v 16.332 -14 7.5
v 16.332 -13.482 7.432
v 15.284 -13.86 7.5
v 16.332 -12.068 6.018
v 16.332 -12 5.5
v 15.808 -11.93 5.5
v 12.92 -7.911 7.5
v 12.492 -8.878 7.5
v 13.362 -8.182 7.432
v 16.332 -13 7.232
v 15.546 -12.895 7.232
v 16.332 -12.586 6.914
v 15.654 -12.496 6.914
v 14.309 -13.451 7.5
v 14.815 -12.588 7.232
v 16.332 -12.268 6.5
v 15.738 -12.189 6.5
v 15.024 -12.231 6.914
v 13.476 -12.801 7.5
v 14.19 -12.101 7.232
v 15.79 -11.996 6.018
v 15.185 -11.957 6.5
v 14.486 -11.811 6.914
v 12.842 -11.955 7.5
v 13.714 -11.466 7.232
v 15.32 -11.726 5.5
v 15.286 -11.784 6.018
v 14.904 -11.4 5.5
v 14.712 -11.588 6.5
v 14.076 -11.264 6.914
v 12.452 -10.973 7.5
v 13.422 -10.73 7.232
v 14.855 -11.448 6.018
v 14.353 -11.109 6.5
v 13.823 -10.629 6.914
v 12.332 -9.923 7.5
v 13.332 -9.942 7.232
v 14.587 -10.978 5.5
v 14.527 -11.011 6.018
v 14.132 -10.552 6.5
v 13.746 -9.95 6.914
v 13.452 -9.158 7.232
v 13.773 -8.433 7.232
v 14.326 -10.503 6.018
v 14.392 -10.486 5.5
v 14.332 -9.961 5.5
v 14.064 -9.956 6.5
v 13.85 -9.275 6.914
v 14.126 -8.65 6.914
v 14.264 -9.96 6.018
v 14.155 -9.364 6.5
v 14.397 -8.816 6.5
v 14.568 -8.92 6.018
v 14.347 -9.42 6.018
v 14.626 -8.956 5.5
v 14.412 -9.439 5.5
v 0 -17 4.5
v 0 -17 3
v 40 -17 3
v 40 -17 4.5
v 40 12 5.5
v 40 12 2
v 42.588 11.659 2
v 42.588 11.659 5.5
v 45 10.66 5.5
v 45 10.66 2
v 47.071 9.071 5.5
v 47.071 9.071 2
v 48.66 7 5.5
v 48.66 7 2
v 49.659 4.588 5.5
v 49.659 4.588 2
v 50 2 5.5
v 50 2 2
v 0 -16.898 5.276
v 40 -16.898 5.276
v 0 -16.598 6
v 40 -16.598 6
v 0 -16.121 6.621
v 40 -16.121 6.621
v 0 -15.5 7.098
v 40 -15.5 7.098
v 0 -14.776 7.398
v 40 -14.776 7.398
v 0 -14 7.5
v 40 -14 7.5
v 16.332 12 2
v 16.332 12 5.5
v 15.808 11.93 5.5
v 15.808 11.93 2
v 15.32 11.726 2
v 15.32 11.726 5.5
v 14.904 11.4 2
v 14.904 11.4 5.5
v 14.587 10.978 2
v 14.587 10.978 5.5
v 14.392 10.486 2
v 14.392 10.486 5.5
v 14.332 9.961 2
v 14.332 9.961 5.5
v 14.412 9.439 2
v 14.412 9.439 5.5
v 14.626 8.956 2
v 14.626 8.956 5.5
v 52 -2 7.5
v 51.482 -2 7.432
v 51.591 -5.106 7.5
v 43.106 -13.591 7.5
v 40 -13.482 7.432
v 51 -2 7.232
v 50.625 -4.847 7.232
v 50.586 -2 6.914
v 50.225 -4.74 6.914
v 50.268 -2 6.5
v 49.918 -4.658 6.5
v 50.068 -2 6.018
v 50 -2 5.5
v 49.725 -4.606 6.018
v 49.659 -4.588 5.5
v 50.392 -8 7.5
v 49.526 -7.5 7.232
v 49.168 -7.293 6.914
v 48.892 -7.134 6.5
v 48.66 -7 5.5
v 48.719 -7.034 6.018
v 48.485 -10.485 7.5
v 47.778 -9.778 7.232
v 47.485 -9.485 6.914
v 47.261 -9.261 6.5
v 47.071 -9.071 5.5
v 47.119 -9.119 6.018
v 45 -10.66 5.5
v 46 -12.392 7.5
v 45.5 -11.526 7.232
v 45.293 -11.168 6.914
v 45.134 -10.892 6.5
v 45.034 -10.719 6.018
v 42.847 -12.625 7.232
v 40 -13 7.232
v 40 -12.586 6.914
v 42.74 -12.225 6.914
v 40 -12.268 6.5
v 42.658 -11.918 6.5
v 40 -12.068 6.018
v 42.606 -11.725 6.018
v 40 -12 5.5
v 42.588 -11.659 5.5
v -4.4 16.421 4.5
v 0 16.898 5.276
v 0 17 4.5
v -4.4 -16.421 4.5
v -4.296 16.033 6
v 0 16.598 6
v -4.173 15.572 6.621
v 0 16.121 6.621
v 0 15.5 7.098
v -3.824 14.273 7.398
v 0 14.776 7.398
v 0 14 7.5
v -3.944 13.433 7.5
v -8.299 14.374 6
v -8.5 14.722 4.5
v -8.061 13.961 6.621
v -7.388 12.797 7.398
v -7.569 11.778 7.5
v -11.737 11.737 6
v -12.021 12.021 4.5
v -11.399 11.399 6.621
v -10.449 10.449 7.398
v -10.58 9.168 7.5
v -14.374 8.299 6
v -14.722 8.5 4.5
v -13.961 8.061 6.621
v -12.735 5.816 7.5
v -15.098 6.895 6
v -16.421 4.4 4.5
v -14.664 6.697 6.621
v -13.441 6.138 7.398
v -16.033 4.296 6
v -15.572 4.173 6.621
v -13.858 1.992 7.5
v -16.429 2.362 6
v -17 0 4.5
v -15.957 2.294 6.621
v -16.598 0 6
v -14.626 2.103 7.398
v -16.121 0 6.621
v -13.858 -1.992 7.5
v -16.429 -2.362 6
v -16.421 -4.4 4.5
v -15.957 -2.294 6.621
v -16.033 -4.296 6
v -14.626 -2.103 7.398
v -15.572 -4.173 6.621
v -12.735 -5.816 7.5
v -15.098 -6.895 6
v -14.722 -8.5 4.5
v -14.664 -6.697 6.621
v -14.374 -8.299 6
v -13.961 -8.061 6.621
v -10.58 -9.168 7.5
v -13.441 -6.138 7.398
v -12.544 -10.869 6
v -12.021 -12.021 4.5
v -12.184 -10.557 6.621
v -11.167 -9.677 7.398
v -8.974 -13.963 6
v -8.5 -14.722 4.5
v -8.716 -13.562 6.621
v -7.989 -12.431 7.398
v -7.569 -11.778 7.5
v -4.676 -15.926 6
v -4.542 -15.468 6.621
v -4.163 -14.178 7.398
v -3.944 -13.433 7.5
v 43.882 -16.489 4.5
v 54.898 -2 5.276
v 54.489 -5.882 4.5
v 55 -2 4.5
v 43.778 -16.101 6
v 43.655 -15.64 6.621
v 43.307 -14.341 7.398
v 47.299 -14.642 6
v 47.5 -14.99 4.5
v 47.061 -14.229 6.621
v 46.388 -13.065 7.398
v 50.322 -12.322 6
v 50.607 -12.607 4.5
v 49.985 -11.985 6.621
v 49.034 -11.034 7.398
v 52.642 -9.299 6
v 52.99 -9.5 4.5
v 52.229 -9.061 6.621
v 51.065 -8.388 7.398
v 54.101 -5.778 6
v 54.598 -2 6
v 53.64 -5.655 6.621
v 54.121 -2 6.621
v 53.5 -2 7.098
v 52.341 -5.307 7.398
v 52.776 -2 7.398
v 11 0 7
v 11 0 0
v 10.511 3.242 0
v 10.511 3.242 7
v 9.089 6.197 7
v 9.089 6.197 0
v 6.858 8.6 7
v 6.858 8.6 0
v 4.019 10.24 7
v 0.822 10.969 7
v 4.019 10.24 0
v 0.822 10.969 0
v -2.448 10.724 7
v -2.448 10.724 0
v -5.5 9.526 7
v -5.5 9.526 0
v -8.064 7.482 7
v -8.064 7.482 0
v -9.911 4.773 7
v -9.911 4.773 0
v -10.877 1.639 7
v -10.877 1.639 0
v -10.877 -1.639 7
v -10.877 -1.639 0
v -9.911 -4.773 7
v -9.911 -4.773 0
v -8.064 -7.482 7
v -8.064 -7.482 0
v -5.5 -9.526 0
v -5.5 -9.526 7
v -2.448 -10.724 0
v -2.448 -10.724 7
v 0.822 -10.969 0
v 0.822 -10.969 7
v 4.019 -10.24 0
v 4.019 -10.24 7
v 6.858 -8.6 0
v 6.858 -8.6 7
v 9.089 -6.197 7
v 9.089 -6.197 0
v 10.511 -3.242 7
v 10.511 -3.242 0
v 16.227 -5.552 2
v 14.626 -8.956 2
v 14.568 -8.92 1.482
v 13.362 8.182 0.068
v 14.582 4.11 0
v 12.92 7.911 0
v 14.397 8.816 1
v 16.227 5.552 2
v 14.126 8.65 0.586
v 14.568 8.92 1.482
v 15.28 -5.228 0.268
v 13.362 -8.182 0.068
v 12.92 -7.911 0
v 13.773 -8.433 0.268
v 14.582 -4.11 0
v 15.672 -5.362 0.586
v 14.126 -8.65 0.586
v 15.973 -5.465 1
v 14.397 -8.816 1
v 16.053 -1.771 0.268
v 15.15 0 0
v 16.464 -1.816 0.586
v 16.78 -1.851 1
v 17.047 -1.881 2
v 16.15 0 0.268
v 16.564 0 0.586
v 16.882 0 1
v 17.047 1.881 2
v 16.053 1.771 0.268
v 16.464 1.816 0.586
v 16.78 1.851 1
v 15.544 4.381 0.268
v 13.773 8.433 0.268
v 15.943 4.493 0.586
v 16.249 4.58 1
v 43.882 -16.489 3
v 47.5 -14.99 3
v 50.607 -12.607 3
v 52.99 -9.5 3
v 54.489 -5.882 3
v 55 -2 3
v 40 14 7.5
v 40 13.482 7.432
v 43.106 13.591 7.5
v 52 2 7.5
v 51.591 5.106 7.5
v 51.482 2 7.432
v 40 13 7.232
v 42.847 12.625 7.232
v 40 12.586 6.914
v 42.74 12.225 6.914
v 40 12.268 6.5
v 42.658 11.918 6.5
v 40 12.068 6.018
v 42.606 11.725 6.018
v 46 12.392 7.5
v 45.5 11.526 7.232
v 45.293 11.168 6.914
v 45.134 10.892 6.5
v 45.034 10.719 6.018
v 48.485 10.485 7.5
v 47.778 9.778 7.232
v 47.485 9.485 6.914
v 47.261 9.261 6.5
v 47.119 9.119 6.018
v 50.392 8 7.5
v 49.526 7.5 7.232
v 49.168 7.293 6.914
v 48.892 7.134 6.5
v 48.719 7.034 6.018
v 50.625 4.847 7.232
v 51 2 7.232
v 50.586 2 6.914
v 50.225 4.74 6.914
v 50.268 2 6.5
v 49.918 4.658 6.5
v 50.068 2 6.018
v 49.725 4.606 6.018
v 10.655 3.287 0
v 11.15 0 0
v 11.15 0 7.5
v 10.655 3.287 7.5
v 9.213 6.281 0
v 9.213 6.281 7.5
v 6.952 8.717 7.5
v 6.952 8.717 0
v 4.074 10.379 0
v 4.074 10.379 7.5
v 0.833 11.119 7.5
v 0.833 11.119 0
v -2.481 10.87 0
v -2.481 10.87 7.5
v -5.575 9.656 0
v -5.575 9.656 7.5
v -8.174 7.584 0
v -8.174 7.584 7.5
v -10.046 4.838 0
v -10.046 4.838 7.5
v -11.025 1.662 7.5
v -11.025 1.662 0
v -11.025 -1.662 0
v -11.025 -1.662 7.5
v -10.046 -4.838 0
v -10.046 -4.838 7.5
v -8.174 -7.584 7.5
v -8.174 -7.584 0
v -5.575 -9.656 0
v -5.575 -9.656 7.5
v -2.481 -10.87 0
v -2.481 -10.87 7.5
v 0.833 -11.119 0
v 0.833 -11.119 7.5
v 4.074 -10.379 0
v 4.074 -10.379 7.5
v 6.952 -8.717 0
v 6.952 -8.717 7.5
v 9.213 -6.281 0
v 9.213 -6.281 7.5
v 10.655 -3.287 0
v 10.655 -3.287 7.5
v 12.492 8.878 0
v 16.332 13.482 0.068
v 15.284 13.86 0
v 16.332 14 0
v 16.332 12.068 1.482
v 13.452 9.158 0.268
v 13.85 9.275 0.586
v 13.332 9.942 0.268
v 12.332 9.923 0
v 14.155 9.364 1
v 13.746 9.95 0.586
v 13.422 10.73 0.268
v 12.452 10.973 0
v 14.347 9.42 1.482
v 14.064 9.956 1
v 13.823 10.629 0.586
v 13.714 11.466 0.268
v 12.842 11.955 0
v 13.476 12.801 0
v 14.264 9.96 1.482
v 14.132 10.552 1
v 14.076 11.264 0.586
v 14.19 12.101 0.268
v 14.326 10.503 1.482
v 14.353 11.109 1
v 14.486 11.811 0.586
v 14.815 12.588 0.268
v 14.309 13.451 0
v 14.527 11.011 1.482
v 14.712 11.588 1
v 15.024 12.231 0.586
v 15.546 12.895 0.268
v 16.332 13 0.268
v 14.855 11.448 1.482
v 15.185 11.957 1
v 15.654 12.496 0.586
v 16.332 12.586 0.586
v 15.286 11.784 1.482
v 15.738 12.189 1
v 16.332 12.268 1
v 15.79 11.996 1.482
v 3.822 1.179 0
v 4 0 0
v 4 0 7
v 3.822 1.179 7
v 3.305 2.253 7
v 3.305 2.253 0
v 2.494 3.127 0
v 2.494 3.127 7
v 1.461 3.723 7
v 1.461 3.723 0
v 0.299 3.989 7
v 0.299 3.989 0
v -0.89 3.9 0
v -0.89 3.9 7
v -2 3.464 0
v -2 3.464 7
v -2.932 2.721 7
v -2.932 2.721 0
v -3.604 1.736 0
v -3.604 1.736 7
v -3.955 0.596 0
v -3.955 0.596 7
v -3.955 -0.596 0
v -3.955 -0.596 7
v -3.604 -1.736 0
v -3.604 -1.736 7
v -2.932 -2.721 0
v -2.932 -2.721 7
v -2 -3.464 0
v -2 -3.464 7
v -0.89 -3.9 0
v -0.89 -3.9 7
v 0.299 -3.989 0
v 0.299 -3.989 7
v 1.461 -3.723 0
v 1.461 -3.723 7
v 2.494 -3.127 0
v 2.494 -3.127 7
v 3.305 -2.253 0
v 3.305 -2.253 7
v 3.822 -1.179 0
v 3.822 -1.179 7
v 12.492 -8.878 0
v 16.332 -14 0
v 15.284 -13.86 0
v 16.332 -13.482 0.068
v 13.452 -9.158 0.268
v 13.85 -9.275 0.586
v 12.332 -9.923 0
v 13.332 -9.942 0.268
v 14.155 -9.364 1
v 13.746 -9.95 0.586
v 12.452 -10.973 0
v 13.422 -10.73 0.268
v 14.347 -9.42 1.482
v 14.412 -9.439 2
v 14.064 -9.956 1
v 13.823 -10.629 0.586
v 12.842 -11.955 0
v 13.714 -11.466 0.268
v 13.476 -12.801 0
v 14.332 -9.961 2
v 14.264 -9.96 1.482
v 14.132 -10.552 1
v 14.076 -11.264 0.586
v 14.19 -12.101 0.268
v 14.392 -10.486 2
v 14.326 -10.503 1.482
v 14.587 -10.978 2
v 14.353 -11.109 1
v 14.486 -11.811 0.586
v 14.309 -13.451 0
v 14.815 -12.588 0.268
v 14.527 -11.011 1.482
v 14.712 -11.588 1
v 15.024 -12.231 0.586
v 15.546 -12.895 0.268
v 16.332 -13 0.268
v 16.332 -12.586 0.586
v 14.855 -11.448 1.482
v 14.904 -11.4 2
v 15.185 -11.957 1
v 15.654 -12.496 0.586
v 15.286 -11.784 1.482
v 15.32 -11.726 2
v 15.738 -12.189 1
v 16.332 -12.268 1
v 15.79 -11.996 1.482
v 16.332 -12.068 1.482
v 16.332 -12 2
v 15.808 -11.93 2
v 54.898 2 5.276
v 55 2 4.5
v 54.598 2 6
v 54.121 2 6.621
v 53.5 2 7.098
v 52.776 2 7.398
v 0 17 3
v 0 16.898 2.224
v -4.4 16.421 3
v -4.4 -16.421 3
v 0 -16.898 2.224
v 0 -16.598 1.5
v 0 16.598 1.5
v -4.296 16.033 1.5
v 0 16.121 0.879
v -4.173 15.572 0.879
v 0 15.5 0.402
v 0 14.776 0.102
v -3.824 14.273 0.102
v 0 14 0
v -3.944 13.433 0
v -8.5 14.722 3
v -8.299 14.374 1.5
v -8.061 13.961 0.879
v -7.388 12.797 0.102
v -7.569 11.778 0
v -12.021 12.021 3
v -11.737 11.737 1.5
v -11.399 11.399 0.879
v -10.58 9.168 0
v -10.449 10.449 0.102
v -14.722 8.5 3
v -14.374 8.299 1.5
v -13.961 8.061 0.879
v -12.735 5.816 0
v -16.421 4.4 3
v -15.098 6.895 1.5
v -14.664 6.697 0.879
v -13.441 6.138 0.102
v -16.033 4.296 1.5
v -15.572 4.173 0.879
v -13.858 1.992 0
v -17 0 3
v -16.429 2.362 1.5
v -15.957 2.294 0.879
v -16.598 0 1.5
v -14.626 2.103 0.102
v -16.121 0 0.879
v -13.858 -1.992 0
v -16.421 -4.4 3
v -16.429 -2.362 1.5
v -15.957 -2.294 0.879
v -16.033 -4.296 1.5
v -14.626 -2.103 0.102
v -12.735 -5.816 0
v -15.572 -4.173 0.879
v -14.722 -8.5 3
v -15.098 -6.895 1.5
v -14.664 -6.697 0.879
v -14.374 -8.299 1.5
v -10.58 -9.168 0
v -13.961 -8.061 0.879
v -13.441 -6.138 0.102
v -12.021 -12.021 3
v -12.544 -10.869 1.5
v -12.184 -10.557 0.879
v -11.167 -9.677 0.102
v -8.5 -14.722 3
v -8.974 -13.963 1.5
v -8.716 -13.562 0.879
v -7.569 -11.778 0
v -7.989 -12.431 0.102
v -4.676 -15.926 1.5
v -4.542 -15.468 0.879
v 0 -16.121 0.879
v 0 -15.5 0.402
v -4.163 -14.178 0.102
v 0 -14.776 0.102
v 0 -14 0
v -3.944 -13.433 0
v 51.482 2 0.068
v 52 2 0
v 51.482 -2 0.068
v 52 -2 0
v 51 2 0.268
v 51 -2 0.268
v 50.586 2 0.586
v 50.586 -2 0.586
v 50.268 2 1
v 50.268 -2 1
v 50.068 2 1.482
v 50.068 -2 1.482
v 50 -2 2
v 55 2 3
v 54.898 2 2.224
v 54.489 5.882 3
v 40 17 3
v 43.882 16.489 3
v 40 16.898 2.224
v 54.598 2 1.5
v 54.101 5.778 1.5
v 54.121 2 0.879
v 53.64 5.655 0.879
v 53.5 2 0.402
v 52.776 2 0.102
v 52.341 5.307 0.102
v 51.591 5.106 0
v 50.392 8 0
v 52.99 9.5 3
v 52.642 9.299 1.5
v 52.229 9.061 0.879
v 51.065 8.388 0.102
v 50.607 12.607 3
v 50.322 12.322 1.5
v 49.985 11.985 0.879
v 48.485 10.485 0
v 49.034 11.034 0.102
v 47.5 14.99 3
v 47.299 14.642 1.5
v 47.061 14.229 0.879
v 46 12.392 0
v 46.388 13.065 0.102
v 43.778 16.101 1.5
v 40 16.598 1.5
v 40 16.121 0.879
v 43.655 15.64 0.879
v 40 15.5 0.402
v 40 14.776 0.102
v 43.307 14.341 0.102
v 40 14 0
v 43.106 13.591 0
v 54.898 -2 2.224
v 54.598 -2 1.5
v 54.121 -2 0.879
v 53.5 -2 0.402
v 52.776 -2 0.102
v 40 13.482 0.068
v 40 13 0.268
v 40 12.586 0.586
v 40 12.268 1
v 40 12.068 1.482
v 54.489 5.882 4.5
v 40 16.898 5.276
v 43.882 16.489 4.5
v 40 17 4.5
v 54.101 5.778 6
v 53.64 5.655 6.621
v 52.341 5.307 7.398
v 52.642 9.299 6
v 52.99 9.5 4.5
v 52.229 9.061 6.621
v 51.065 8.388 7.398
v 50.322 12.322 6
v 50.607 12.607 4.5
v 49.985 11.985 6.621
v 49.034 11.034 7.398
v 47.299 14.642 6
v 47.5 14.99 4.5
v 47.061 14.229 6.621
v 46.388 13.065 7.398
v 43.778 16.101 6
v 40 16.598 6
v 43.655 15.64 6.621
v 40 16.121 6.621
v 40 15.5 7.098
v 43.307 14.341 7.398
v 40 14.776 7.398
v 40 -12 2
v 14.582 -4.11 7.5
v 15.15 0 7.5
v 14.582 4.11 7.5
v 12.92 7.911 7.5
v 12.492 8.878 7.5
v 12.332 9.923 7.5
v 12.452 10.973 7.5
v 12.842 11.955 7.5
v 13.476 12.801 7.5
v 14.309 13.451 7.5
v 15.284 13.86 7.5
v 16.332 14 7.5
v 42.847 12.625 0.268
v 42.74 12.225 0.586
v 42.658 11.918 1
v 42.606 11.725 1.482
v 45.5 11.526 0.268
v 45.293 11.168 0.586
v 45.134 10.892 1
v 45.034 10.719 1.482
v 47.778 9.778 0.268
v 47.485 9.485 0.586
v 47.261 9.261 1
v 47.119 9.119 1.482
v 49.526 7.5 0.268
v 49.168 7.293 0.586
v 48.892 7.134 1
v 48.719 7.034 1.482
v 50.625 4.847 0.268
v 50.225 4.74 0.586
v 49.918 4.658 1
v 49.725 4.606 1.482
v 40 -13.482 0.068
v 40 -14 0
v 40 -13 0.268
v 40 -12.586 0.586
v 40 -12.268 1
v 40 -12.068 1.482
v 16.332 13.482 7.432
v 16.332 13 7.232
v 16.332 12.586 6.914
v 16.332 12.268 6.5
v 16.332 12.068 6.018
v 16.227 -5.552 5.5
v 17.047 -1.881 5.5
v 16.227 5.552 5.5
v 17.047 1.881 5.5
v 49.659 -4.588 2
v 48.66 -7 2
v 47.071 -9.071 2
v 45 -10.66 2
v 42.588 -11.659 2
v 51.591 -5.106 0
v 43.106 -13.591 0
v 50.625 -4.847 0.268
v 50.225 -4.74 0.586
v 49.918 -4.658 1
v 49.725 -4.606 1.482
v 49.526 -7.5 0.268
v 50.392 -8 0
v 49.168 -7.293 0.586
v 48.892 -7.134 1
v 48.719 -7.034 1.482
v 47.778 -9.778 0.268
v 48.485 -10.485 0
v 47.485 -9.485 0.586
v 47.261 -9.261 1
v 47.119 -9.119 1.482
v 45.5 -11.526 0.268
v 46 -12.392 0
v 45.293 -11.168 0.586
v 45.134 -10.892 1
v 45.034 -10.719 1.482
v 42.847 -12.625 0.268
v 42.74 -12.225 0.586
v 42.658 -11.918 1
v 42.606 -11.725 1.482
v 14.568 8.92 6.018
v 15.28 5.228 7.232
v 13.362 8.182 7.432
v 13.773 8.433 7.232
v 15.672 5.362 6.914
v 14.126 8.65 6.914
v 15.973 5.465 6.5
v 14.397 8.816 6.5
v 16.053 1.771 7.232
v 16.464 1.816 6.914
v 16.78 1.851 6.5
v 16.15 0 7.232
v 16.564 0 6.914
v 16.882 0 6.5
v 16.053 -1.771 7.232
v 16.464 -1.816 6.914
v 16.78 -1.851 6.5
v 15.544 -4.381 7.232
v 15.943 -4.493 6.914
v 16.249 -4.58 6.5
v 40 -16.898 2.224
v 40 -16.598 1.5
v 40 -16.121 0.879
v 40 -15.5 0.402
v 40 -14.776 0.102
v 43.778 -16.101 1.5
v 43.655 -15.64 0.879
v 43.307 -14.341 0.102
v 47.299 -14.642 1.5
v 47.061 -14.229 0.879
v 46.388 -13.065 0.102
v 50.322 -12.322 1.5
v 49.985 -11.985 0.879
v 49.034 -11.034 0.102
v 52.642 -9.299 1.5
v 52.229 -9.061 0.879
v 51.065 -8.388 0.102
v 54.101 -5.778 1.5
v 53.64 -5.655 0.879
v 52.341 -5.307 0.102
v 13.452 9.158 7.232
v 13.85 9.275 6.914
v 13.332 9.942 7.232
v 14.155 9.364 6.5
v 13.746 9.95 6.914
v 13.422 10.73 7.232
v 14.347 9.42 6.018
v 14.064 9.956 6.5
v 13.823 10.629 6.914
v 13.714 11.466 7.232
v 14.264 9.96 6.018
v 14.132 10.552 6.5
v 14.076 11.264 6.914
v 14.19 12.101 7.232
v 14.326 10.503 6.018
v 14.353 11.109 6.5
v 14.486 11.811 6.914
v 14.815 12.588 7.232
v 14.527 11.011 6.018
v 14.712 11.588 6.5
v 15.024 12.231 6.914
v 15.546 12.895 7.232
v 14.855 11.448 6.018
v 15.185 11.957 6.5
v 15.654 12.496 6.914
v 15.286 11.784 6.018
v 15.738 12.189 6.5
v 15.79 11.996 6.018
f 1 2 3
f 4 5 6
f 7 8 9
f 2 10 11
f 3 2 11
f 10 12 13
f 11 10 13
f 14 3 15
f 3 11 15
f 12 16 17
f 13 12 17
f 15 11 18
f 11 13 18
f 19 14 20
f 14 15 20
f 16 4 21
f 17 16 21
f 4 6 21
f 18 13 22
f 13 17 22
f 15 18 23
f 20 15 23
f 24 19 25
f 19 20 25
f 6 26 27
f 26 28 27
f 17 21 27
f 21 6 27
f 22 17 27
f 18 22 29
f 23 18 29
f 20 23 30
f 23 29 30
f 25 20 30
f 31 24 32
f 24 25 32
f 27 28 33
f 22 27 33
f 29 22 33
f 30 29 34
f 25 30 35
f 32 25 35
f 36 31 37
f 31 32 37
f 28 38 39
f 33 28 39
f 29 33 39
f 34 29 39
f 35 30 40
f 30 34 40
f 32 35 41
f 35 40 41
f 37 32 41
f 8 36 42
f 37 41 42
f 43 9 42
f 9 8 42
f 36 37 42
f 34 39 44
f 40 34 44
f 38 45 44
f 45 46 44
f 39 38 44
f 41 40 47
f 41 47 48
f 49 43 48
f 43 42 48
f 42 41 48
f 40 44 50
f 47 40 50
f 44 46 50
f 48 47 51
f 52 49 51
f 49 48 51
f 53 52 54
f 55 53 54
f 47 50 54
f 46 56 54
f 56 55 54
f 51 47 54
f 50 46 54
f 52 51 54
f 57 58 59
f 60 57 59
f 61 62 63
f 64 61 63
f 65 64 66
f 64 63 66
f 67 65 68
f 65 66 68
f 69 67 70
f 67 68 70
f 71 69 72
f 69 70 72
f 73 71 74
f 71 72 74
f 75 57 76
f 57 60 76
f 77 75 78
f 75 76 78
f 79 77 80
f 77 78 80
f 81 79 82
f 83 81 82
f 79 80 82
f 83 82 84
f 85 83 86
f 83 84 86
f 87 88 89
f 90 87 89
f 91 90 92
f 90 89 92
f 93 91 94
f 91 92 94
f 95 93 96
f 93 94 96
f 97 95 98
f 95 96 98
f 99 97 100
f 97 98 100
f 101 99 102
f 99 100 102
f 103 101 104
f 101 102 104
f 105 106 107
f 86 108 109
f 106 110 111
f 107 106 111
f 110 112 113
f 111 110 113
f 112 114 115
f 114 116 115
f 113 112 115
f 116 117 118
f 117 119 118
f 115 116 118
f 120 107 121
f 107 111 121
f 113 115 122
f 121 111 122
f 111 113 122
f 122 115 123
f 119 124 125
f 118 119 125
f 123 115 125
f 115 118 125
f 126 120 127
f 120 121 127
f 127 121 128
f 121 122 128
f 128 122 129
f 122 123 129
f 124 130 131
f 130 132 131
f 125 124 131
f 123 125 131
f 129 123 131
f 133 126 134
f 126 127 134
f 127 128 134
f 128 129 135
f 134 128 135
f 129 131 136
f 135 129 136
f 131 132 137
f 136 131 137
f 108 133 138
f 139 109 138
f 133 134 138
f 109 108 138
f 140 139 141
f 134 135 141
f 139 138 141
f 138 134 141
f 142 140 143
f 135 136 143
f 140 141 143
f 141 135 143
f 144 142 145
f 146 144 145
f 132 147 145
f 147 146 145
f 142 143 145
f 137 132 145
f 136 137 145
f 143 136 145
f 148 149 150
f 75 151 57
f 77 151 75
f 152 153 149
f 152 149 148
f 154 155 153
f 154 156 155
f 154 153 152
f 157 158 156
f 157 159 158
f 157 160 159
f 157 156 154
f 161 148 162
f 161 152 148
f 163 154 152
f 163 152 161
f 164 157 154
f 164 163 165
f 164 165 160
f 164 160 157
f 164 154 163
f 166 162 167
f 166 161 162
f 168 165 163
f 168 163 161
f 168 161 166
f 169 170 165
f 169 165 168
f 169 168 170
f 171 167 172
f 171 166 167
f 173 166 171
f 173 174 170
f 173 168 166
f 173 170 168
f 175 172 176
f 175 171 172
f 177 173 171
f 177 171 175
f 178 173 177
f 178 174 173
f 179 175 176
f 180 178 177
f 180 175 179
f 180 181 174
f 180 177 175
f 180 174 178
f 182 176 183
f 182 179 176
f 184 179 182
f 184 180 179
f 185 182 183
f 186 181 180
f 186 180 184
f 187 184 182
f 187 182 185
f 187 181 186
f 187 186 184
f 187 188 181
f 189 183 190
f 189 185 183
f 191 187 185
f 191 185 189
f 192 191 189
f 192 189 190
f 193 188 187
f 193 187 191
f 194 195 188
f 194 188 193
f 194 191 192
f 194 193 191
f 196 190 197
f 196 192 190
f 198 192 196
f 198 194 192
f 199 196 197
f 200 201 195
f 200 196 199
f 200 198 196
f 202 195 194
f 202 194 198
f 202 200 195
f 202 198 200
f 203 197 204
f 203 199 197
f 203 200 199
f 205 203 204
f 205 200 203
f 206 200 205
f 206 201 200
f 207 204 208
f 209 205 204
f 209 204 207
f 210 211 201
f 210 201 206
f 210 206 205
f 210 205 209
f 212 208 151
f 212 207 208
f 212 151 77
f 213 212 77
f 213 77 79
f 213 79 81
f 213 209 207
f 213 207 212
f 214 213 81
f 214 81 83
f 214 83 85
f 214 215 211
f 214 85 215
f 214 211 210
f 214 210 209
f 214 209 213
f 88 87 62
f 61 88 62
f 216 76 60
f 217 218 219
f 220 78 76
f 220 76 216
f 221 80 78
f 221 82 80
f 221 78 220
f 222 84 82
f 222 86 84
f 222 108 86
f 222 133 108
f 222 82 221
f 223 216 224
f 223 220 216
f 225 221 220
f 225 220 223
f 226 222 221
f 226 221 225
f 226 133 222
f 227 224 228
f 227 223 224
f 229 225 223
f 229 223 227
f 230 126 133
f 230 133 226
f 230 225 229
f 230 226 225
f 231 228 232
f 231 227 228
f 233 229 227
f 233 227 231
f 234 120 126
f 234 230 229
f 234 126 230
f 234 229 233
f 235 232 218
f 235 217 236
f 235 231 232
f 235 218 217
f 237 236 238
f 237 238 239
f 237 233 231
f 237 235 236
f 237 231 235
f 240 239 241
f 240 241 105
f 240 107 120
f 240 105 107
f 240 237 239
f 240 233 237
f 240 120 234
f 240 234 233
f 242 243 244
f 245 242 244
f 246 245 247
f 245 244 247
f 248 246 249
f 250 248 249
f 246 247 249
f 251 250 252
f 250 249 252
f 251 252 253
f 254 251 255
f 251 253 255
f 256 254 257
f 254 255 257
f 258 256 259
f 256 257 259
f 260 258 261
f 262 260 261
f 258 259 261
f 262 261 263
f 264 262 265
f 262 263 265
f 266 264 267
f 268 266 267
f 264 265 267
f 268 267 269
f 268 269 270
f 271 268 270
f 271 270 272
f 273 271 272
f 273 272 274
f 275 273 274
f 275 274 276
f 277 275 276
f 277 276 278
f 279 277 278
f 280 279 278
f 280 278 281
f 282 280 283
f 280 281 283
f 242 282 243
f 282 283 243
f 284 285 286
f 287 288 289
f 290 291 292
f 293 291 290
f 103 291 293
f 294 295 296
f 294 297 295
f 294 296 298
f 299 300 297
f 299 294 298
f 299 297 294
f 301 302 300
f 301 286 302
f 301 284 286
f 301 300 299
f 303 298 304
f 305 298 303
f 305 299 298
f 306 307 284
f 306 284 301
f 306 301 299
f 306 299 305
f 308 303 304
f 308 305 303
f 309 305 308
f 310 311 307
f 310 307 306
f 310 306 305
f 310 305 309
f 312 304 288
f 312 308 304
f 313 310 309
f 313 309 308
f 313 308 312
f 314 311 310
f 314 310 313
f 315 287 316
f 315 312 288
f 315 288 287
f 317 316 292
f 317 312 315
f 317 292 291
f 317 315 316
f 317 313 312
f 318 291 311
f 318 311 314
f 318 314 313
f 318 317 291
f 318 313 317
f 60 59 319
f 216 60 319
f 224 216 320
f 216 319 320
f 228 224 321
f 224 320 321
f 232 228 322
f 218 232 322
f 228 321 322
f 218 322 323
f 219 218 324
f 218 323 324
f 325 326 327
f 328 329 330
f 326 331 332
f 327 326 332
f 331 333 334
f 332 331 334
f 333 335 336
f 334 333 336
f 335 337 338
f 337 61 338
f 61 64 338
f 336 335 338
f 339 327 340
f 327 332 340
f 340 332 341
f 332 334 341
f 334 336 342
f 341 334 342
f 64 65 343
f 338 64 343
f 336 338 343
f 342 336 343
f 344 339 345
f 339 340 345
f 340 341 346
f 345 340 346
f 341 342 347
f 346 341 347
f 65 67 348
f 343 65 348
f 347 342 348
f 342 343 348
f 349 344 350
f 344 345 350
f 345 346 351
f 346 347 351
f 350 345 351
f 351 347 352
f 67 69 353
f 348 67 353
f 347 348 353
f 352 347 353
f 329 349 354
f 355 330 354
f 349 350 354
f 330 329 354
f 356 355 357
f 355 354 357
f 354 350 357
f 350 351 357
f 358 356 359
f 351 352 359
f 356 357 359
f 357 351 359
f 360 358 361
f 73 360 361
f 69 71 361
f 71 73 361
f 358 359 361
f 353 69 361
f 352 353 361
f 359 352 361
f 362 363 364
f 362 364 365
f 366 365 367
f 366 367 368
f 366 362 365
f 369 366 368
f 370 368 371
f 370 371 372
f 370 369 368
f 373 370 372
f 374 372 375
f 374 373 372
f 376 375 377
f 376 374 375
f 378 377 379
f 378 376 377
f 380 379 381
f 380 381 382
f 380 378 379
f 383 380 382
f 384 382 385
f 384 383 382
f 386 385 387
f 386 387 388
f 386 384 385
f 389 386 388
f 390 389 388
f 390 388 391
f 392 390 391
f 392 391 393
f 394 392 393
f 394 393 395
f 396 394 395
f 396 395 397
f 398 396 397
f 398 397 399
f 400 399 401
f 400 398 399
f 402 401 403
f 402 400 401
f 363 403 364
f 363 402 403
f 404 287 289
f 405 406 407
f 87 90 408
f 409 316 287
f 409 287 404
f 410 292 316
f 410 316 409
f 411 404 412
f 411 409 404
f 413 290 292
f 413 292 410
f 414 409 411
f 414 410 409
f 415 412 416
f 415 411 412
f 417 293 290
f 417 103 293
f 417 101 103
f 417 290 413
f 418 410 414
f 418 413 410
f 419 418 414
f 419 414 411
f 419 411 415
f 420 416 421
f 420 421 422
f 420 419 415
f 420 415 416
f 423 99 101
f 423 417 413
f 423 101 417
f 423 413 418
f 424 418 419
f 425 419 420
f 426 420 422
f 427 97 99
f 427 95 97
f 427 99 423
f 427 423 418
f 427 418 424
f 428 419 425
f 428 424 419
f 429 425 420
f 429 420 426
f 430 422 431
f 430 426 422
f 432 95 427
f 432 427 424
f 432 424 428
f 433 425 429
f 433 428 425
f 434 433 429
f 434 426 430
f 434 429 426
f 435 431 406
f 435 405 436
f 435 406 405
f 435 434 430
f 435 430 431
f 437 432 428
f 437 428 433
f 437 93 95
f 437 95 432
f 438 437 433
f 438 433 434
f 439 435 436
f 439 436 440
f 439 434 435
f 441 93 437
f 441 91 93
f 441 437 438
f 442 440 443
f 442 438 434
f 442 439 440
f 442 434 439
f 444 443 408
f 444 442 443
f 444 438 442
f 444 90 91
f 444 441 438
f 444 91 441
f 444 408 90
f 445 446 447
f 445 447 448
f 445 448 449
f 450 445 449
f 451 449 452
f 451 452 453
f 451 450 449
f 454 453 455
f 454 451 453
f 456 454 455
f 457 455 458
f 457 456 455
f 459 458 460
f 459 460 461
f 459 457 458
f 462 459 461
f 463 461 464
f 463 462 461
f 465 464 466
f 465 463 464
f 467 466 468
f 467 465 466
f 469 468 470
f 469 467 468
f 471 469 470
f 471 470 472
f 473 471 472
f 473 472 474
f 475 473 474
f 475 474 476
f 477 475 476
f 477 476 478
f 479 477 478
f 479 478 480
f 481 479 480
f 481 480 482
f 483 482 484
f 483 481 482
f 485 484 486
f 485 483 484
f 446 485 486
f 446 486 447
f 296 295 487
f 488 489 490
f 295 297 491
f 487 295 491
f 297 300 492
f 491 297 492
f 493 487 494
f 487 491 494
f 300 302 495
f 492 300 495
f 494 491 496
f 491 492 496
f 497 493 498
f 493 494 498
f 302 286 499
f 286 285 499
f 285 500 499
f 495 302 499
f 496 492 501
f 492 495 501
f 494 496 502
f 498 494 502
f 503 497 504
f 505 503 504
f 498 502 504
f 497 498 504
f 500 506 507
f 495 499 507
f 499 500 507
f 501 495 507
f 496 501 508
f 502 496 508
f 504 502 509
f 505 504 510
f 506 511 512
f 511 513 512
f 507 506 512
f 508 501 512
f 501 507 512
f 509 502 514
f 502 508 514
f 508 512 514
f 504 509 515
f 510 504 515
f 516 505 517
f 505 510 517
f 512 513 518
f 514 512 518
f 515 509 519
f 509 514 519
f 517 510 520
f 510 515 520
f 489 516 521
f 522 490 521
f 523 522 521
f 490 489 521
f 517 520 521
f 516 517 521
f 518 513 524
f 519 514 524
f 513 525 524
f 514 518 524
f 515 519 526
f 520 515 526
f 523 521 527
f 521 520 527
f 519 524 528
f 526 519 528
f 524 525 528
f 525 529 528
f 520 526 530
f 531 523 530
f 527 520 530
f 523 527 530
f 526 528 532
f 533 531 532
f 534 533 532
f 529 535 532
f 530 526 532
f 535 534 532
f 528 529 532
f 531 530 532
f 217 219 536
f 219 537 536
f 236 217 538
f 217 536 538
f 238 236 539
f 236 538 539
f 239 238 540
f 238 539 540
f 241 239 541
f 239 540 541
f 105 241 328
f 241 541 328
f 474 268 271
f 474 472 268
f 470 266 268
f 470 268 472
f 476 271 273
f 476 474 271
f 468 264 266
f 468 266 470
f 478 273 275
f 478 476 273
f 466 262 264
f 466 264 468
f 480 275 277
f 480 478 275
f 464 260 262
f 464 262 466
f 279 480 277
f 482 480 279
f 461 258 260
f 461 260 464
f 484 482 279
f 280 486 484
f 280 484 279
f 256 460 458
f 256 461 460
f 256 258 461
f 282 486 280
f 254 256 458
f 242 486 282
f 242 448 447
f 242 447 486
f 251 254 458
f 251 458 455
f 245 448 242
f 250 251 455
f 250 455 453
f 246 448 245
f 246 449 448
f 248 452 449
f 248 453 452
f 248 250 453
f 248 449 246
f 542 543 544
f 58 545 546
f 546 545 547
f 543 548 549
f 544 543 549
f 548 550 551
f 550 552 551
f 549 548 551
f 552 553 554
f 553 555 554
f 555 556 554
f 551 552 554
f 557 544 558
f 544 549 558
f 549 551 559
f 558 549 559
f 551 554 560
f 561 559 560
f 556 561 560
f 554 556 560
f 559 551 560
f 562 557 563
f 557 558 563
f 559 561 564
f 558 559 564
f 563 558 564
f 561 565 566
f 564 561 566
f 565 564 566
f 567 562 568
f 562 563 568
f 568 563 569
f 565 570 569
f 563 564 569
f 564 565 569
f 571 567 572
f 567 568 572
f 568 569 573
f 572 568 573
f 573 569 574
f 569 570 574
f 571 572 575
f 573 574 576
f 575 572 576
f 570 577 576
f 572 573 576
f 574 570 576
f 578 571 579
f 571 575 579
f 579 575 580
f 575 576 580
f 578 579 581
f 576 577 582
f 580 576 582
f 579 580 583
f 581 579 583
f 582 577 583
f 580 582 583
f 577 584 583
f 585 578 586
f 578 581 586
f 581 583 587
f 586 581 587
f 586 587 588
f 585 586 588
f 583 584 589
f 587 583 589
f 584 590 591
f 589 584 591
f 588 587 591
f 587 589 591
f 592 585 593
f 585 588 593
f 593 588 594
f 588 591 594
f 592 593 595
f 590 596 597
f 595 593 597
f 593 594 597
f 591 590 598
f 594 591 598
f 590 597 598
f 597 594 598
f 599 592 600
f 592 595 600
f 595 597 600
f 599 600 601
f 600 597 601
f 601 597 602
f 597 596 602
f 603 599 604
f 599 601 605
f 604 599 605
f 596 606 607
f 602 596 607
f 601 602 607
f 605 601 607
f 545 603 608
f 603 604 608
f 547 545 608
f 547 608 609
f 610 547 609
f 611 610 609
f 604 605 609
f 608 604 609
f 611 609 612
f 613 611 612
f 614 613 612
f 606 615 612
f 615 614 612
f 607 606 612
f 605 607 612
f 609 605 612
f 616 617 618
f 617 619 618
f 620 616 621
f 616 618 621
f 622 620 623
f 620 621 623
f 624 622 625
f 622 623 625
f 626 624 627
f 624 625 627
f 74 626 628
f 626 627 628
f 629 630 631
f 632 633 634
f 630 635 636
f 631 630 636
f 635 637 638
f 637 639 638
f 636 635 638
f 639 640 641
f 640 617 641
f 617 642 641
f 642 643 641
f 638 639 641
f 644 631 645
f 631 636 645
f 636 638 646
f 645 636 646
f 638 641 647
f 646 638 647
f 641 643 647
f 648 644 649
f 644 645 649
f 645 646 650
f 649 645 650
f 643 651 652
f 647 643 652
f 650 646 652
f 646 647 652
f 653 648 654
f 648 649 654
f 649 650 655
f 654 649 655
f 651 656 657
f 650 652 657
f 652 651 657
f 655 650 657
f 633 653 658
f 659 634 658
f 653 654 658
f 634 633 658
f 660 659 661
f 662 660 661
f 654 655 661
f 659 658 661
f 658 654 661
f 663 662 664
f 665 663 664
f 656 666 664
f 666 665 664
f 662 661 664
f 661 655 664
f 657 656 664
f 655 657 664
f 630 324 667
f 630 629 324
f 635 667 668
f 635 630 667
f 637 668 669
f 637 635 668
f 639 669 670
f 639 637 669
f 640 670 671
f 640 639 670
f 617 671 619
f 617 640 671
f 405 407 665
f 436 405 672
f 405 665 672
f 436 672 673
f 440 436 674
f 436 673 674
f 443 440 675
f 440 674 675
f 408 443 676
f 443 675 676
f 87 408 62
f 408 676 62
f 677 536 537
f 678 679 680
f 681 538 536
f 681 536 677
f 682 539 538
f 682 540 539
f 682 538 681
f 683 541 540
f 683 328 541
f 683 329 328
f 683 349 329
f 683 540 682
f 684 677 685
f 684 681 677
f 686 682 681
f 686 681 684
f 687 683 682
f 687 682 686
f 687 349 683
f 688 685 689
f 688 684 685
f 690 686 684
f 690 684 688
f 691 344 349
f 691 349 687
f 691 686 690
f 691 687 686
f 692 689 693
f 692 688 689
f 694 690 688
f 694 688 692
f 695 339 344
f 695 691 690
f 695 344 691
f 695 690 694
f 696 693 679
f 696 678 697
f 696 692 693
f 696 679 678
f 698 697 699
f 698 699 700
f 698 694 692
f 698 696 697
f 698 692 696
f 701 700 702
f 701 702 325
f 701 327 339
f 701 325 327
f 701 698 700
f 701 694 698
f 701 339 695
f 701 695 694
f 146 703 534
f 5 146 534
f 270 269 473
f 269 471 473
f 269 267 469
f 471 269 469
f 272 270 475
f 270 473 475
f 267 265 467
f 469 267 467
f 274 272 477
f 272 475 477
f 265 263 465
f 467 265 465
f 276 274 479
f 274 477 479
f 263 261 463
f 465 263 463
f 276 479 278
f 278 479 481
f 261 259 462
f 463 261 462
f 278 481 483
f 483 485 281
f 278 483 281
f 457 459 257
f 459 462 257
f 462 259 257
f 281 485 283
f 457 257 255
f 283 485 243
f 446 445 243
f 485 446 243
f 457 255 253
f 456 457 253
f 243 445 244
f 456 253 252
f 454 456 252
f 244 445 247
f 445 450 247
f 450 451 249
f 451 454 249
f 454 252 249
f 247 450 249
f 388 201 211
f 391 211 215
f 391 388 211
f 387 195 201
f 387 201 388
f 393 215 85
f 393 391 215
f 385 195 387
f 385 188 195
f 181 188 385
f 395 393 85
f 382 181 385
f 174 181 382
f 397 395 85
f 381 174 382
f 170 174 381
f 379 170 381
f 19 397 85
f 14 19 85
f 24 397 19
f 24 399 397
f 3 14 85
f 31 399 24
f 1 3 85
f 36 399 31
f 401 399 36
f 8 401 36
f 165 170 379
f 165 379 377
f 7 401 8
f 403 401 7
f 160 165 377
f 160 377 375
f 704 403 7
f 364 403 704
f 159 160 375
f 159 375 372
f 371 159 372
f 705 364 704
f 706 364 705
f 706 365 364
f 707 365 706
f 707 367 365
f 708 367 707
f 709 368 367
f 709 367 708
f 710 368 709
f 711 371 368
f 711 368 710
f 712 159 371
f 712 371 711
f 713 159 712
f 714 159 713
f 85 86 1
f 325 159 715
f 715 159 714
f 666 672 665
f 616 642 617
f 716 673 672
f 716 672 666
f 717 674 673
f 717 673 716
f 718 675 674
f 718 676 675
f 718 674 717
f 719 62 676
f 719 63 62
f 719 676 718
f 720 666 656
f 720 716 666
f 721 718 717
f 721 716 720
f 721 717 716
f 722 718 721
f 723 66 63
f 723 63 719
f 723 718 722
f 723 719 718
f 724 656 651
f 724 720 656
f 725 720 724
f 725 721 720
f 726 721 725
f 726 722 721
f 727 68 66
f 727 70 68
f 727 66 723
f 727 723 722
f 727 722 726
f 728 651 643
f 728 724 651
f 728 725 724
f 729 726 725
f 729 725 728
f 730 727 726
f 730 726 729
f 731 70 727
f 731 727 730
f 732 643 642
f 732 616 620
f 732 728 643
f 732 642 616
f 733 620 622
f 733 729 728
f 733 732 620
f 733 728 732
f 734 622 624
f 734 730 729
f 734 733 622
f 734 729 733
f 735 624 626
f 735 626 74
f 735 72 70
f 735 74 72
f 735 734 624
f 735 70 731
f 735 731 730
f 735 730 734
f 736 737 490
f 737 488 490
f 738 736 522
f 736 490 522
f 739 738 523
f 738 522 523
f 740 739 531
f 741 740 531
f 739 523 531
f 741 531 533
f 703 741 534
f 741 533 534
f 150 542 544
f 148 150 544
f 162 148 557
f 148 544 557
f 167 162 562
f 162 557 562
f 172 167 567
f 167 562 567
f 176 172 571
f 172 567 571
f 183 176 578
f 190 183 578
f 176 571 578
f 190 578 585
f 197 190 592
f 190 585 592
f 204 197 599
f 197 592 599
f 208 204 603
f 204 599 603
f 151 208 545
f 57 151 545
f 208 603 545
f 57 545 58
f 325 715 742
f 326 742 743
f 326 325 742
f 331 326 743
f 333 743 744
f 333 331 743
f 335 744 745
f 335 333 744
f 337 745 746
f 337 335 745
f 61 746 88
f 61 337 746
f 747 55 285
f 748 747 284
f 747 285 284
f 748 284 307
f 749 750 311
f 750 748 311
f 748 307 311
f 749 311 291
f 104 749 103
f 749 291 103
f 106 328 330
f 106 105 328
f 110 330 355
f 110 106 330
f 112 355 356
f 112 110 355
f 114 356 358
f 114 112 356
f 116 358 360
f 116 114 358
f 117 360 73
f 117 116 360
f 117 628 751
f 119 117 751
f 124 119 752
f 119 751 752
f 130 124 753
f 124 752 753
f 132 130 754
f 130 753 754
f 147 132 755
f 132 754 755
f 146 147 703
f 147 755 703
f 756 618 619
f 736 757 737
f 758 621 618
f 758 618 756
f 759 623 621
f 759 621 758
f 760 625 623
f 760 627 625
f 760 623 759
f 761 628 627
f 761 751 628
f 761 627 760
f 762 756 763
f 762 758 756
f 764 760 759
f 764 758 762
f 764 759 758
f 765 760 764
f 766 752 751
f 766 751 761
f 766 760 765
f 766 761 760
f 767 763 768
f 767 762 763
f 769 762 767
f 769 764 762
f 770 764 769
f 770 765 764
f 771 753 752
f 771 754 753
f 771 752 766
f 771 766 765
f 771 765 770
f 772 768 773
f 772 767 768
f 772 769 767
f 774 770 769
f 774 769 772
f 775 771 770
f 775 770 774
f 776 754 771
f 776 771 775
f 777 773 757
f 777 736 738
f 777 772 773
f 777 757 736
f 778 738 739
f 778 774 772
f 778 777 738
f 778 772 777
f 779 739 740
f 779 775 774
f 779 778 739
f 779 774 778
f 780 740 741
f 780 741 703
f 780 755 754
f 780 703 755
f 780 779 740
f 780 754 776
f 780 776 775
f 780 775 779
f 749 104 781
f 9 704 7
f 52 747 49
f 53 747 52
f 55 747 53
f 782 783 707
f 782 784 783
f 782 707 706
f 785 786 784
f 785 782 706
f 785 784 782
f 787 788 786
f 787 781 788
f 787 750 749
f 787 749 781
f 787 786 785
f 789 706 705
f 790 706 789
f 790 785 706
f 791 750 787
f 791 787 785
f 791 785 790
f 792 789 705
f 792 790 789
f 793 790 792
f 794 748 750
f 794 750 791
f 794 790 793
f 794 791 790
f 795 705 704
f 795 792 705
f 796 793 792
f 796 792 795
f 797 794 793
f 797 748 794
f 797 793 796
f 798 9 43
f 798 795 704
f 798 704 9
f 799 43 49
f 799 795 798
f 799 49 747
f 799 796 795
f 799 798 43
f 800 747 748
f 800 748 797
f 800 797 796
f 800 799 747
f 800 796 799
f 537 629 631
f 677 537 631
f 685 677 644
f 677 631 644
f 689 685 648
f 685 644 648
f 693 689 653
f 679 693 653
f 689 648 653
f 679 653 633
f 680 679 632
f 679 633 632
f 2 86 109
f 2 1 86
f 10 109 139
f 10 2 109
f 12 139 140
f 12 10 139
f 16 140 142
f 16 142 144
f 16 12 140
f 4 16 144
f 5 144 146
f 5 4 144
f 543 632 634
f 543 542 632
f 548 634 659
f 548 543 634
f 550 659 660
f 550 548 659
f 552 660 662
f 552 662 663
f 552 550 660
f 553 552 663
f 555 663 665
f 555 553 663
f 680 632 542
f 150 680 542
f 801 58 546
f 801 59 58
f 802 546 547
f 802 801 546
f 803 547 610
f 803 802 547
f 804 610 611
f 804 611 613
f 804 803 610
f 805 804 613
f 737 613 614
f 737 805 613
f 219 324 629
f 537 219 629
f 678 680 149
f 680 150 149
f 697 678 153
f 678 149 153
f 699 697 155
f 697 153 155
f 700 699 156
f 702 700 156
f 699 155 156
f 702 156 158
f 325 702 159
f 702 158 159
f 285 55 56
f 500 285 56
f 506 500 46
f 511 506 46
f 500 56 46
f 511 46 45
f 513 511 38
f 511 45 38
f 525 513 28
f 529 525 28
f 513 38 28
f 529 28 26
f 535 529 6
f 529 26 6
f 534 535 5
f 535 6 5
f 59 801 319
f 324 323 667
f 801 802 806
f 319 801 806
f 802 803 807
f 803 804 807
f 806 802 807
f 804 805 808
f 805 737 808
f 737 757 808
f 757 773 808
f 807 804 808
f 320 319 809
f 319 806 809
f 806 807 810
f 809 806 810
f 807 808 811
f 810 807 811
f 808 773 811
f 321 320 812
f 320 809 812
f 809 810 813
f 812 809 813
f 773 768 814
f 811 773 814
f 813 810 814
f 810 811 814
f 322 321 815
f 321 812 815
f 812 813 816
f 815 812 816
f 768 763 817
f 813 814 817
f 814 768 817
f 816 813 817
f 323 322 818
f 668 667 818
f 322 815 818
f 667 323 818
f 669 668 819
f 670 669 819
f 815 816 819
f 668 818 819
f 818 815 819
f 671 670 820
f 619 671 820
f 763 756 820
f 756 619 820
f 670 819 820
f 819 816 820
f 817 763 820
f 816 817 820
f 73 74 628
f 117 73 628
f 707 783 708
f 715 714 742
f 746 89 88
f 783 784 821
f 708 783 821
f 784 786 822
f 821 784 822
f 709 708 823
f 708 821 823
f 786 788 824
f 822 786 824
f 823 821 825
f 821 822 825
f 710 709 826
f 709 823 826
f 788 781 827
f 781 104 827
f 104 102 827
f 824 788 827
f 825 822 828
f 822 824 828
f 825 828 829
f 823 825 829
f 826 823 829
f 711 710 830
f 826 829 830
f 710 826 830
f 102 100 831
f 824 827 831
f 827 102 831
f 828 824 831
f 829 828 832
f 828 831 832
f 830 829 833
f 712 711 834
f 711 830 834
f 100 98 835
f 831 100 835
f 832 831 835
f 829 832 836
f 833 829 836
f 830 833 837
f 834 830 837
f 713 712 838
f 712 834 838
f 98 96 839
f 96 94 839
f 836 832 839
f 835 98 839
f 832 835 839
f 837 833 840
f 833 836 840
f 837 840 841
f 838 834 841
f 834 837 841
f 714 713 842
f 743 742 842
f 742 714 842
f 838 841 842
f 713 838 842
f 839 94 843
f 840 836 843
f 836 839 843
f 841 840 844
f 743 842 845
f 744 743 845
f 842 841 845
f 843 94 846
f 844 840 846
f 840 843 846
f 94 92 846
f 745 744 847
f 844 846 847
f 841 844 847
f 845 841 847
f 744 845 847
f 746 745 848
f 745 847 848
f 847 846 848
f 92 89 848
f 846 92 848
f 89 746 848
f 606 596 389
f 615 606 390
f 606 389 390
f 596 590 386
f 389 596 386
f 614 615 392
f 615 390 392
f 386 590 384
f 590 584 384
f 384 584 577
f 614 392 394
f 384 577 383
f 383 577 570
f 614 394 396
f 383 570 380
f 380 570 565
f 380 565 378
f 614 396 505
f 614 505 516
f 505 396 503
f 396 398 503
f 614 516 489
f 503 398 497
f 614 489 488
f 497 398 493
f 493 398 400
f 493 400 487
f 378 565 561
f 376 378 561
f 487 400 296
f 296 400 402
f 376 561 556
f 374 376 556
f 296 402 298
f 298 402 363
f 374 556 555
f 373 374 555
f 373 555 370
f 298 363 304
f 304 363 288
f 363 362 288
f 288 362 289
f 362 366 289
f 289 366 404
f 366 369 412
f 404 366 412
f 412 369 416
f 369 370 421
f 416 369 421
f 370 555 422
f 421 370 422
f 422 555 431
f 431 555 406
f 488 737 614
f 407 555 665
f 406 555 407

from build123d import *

# Parameters (mm, degrees)
F0_R     = 11
F0_R_2   = 4
F1_DEPTH = 7
F2_R     = 11.15
F3_DEPTH = 7.5
F4_R     = 3
F6_DEPTH = 25
F7_R     = 1.99999


# Not quite as in the source:
# - a fillet or chamfer is up to 0.001 mm smaller than in the source, because OpenCascade refuses the exact size


with BuildPart() as f1:
    # F0 (on Top) → F1 (new body)
    with BuildSketch(Plane.XY):
        Circle(F0_R)
        Circle(F0_R_2, mode=Mode.SUBTRACT)
    extrude(amount=F1_DEPTH)


with BuildPart() as f3:
    # F2 (on Top) → F3 (new body)
    with BuildSketch(Plane.XY):
        with BuildLine():
            Line((40, 17), (0, 17))
            ThreePointArc((0, 17), (-17, 0), (0, -17))
            Line((0, -17), (40, -17))
            ThreePointArc((40, -17), (50.6066017178, -12.6066017178), (55, -2))
            Line((55, -2), (55, 2))
            ThreePointArc((55, 2), (50.6066017178, 12.6066017178), (40, 17))
        make_face()
        Circle(F2_R, mode=Mode.SUBTRACT)
    extrude(amount=F3_DEPTH)

    # F4
    f4_edges = [f3.edges().sort_by_distance(p)[0] for p in [
        (20, -17, 7.5),
        (50.606602, -12.606602, 7.5),
        (20, -17, 0),
        (20, 17, 0),
        (20, 17, 7.5),
        (-17, 0, 0),
        (-17, 0, 7.5),
        (50.606602, -12.606602, 0),
        (55, 0, 0),
        (55, 0, 7.5),
        (50.606602, 12.606602, 0),
        (50.606602, 12.606602, 7.5),
    ]]
    fillet(f4_edges, radius=F4_R)

    # F5 (on face) → F6 (cut)
    with BuildSketch(Plane(origin=(0, 0, 0), x_dir=(1, 0, 0), z_dir=(0, 0, -1))):
        with BuildLine():
            ThreePointArc((50, 2), (47.0710678119, 9.0710678119), (40, 12))
            Line((40, 12), (12.2524487348, 12))
            ThreePointArc((12.2524487348, 12), (17.15, 0), (12.2524487348, -12))
            Line((12.2524487348, -12), (40, -12))
            ThreePointArc((40, -12), (47.0710678119, -9.0710678119), (50, -2))
            Line((50, -2), (50, 2))
        make_face()
    extrude(amount=-F6_DEPTH, mode=Mode.SUBTRACT)

    # F7 (radius 2 in the source; OpenCascade refuses exactly that, so slightly less here)
    f7_edges = [f3.edges().sort_by_distance(p)[0] for p in [
        (26.126224, -12, 0),
        (12.252449, -12, 3.75),
        (47.071068, -9.071068, 7.5),
        (47.071068, 9.071068, 7.5),
        (26.126224, 12, 7.5),
        (47.071068, 9.071068, 0),
        (26.126224, 12, 0),
        (47.071068, -9.071068, 0),
        (50, 0, 7.5),
        (50, 0, 0),
        (12.252449, 12, 3.75),
        (17.15, 0, 0),
        (17.15, 0, 7.5),
        (26.126224, -12, 7.5),
    ]]
    fillet(f7_edges, radius=F7_R)


solid = Compound([f1.part, f3.part])
